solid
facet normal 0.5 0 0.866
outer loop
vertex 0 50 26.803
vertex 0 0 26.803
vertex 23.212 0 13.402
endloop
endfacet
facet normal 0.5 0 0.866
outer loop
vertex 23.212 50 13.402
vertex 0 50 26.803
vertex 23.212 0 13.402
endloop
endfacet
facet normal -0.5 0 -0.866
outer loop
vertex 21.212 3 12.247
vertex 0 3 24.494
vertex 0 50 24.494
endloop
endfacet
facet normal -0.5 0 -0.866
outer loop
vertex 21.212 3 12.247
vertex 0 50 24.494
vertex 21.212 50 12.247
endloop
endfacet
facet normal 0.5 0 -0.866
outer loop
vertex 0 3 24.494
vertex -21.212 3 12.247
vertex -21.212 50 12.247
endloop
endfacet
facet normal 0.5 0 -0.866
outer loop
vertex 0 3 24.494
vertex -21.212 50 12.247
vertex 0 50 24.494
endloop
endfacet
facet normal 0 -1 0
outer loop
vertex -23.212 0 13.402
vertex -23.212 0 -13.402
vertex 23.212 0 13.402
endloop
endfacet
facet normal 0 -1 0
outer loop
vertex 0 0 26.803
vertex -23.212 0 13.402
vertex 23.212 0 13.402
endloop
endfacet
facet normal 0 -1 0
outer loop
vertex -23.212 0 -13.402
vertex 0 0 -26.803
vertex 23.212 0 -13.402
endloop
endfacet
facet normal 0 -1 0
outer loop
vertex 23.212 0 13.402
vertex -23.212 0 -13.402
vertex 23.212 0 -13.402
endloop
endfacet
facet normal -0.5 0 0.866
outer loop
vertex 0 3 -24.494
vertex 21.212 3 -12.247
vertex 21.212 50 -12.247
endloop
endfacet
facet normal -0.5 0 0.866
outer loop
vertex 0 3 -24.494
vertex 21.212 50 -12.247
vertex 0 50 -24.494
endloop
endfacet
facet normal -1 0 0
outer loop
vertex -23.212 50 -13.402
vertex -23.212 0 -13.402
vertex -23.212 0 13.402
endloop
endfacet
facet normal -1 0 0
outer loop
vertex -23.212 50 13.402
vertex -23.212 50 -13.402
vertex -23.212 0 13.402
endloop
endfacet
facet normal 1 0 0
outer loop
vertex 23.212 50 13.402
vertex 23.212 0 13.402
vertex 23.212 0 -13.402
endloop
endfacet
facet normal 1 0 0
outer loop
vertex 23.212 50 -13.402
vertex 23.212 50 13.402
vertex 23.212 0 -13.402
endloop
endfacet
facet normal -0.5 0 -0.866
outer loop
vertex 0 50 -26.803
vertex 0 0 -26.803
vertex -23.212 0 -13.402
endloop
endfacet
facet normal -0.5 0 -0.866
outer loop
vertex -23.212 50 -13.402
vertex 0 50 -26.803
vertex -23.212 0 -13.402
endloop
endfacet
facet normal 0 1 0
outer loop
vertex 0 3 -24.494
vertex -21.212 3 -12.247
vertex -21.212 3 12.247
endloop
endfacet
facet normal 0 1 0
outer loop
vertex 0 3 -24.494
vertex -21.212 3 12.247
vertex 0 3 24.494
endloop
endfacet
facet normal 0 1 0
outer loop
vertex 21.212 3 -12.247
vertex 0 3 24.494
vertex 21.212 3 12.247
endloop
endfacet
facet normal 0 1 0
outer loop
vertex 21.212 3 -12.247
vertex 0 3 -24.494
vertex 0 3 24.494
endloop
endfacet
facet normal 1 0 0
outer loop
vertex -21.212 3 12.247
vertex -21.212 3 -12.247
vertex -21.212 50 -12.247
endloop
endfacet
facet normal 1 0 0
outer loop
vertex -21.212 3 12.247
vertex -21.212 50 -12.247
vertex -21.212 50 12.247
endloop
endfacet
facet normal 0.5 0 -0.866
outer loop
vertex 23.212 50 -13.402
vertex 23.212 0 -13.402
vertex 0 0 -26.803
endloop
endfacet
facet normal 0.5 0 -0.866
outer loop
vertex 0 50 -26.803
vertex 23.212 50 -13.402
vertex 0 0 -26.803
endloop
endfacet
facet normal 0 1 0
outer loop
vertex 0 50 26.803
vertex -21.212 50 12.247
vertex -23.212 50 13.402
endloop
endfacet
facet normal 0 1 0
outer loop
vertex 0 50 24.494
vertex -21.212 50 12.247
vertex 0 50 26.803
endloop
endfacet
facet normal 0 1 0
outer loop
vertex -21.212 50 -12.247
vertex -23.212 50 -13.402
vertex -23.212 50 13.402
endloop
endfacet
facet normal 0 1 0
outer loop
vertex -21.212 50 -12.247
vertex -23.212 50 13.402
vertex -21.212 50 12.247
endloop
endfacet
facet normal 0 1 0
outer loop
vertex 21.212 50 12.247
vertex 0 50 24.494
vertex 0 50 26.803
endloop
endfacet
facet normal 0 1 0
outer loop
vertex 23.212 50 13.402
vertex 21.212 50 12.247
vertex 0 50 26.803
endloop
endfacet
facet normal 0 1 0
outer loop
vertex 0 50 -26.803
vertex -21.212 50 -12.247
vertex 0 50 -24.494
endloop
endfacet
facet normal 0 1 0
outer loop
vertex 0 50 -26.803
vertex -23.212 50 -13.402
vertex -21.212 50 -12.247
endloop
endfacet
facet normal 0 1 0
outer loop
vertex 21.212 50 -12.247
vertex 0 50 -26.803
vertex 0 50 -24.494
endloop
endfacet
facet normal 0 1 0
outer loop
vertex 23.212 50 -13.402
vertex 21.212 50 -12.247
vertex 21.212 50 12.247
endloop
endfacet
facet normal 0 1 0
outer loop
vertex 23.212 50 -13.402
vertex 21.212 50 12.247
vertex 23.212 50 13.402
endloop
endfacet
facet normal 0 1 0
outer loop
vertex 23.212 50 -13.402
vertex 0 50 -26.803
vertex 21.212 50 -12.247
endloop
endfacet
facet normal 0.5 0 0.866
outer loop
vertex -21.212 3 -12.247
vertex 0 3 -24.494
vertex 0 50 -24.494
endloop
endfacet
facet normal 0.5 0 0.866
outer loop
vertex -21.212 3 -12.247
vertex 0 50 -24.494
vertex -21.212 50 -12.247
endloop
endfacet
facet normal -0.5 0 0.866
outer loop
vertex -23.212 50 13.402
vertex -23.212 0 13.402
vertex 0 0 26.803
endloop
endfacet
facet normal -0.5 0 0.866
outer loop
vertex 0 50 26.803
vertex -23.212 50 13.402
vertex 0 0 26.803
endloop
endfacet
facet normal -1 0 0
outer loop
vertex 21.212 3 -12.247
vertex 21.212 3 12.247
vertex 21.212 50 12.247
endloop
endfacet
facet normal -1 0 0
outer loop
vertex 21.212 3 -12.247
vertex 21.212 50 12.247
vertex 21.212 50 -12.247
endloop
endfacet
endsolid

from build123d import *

# Parameters (mm, degrees)
BOSS_EXTRUDE2_DEPTH = 3
BOSS_EXTRUDE3_DEPTH = 50


with BuildPart() as part:
    # Sketch1 → Boss-Extrude2 (new body)
    with BuildSketch(Plane(origin=(0, 0, 0), x_dir=(1, 0, 0), z_dir=(0, 1, 0))):
        Polygon((23.212466677, 13.401723884), (0, 26.803447769), (-23.212466677, 13.401723884), (-23.212466677, -13.401723884), (0, -26.803447769), (23.212466677, -13.401723884), align=None)
    extrude(amount=BOSS_EXTRUDE2_DEPTH)

    # Sketch1<4> → Boss-Extrude3 (add)
    with BuildSketch(Plane(origin=(0, 0, 0), x_dir=(1, 0, 0), z_dir=(0, 1, 0))):
        Polygon((0, 26.803447769), (-23.212466677, 13.401723884), (-23.212466677, -13.401723884), (0, -26.803447769), (23.212466677, -13.401723884), (23.212466677, 13.401723884), align=None)
        Polygon((21.212466677, 12.247023346), (0, 24.494046692), (-21.212466677, 12.247023346), (-21.212466677, -12.247023346), (0, -24.494046692), (21.212466677, -12.247023346), align=None, mode=Mode.SUBTRACT)
    extrude(amount=BOSS_EXTRUDE3_DEPTH)


solid = part.part
